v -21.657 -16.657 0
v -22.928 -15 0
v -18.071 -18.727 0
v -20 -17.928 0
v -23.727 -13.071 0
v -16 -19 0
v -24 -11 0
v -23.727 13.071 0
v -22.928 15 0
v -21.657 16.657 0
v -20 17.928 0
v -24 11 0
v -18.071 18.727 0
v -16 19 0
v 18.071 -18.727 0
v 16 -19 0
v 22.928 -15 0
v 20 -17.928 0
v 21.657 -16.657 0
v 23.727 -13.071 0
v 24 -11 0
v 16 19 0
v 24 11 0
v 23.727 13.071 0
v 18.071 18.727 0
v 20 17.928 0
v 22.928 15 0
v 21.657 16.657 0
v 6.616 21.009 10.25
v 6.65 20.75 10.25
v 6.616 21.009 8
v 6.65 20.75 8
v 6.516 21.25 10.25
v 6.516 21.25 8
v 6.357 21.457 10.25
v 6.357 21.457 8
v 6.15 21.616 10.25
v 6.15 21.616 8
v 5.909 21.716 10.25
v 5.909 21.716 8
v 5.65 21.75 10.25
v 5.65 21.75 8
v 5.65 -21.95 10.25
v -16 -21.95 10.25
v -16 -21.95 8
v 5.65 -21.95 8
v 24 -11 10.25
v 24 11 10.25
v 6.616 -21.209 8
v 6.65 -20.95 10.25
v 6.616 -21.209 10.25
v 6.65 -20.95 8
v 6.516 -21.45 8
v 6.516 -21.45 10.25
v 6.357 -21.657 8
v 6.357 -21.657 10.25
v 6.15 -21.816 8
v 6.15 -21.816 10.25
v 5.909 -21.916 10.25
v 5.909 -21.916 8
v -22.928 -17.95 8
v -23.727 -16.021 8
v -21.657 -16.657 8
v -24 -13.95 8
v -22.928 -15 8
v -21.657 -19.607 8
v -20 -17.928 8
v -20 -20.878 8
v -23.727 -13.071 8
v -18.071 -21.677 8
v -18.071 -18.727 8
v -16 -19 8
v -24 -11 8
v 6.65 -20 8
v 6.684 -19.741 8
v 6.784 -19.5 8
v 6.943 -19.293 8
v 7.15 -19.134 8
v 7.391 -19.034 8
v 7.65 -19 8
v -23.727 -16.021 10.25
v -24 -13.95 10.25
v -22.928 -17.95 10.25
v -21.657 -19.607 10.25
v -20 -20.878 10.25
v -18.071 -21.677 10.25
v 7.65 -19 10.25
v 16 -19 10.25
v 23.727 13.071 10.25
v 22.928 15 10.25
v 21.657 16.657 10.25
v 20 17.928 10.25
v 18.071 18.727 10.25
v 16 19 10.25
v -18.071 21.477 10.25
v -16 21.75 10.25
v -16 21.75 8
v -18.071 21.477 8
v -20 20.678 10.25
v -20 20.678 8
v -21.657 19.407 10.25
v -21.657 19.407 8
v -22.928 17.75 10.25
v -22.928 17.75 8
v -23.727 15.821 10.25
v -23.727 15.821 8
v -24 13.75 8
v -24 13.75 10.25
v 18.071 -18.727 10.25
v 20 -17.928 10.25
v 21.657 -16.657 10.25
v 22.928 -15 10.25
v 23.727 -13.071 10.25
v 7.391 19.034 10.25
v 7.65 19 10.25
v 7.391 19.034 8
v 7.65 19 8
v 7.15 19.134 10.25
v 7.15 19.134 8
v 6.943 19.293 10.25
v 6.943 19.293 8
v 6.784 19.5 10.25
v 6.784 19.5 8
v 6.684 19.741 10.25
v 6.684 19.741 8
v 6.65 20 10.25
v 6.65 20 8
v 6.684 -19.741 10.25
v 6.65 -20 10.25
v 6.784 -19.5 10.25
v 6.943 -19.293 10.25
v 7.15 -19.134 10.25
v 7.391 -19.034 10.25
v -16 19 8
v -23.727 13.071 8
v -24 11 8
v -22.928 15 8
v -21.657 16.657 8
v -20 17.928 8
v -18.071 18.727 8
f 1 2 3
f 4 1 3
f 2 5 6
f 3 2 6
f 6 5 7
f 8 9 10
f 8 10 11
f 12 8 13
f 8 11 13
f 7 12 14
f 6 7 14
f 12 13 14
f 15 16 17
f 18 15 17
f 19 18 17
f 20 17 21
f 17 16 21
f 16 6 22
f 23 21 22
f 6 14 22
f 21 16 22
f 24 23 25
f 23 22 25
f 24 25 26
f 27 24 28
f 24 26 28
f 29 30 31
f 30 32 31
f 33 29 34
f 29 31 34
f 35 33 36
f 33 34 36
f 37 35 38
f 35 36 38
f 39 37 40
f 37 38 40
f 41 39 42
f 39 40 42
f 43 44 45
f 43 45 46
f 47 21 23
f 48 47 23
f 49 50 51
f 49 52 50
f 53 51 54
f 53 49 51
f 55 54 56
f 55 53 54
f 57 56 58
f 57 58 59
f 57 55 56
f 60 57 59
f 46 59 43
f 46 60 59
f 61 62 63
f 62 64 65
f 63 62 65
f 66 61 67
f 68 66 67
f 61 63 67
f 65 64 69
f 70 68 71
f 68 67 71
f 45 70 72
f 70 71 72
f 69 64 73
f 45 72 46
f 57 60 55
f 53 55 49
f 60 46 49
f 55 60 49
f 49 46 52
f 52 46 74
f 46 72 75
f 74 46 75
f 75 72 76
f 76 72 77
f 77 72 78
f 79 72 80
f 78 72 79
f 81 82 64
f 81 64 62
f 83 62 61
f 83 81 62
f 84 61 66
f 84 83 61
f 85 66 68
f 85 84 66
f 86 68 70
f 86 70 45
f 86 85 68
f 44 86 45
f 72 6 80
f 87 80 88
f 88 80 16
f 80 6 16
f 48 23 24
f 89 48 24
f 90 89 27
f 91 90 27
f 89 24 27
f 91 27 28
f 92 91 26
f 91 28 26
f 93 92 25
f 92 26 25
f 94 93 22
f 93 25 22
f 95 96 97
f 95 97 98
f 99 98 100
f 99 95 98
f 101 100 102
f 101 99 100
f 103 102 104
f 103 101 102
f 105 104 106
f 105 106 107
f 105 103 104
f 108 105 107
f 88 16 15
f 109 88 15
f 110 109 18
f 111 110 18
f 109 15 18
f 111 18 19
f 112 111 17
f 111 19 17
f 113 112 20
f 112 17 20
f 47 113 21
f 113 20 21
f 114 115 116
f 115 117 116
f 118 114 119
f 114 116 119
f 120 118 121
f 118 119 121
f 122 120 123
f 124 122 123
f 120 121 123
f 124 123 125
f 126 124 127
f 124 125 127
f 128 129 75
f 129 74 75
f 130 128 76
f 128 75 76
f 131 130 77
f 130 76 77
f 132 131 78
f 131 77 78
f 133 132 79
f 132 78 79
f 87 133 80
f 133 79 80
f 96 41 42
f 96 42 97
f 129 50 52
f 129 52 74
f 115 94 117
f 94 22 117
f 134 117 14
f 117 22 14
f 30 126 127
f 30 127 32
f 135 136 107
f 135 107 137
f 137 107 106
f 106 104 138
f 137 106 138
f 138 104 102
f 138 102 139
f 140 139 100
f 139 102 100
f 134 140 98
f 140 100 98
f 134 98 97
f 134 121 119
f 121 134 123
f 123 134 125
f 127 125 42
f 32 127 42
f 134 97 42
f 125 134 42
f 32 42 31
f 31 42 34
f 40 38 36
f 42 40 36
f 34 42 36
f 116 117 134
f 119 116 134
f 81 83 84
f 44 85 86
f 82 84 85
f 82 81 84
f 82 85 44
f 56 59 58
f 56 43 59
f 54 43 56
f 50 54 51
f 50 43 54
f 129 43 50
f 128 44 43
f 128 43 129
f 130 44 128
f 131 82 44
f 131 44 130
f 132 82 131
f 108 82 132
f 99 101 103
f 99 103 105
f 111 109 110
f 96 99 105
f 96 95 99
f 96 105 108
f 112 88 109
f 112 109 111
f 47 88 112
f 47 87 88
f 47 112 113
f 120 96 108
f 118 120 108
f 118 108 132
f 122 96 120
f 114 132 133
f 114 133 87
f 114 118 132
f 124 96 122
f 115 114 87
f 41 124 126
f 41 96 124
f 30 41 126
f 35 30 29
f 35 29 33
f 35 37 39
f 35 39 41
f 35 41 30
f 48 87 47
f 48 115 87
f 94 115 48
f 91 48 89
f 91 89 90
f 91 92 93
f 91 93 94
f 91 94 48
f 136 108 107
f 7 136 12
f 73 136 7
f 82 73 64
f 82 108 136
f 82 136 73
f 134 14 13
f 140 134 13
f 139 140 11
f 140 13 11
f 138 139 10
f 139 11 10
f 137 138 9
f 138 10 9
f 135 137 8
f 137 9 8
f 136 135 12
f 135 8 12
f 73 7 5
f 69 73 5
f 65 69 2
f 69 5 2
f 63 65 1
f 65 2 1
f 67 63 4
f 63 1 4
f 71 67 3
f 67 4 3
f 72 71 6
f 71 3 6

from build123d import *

# Parameters (mm, degrees)
F1_DEPTH = 10.25
F3_DEPTH = 2.25
F4_R     = 1


with BuildPart() as f1:
    # F0 (on Top) → F1 (new body)
    with BuildSketch(Plane.XY):
        with BuildLine():
            Line((16, 19), (-16, 19))
            ThreePointArc((-16, 19), (-21.6568542495, 16.6568542495), (-24, 11))
            Line((-24, 11), (-24, -11))
            ThreePointArc((-24, -11), (-21.6568542495, -16.6568542495), (-16, -19))
            Line((-16, -19), (16, -19))
            ThreePointArc((16, -19), (21.6568542495, -16.6568542495), (24, -11))
            Line((24, -11), (24, 11))
            ThreePointArc((24, 11), (21.6568542495, 16.6568542495), (16, 19))
        make_face()
    extrude(amount=F1_DEPTH)

    # F2 (on face) → F3 (join)
    with BuildSketch(Plane.XY.offset(10.25)):
        with BuildLine():
            Line((6.65, -21.95), (6.65, -19))
            Line((6.65, -19), (-16, -19))
            ThreePointArc((-16, -19), (-21.6568542495, -16.6568542495), (-24, -11))
            Line((-24, -11), (-24, -13.95))
            ThreePointArc((-24, -13.95), (-21.6568542495, -19.6068542495), (-16, -21.95))
            Line((-16, -21.95), (6.65, -21.95))
        make_face()
        with BuildLine():
            Line((6.65, 21.75), (-16, 21.75))
            ThreePointArc((-16, 21.75), (-21.6568542495, 19.4068542495), (-24, 13.75))
            Line((-24, 13.75), (-24, 11))
            ThreePointArc((-24, 11), (-21.6568542495, 16.6568542495), (-16, 19))
            Line((-16, 19), (6.65, 19))
            Line((6.65, 19), (6.65, 21.75))
        make_face()
    extrude(amount=-F3_DEPTH)

    # F4
    f4_edges = [f1.edges().sort_by_distance(p)[0] for p in [
        (6.65, 21.75, 9.125),
        (6.65, -21.95, 9.125),
        (6.65, -19, 9.125),
        (6.65, 19, 9.125),
    ]]
    fillet(f4_edges, radius=F4_R)


solid = f1.part
